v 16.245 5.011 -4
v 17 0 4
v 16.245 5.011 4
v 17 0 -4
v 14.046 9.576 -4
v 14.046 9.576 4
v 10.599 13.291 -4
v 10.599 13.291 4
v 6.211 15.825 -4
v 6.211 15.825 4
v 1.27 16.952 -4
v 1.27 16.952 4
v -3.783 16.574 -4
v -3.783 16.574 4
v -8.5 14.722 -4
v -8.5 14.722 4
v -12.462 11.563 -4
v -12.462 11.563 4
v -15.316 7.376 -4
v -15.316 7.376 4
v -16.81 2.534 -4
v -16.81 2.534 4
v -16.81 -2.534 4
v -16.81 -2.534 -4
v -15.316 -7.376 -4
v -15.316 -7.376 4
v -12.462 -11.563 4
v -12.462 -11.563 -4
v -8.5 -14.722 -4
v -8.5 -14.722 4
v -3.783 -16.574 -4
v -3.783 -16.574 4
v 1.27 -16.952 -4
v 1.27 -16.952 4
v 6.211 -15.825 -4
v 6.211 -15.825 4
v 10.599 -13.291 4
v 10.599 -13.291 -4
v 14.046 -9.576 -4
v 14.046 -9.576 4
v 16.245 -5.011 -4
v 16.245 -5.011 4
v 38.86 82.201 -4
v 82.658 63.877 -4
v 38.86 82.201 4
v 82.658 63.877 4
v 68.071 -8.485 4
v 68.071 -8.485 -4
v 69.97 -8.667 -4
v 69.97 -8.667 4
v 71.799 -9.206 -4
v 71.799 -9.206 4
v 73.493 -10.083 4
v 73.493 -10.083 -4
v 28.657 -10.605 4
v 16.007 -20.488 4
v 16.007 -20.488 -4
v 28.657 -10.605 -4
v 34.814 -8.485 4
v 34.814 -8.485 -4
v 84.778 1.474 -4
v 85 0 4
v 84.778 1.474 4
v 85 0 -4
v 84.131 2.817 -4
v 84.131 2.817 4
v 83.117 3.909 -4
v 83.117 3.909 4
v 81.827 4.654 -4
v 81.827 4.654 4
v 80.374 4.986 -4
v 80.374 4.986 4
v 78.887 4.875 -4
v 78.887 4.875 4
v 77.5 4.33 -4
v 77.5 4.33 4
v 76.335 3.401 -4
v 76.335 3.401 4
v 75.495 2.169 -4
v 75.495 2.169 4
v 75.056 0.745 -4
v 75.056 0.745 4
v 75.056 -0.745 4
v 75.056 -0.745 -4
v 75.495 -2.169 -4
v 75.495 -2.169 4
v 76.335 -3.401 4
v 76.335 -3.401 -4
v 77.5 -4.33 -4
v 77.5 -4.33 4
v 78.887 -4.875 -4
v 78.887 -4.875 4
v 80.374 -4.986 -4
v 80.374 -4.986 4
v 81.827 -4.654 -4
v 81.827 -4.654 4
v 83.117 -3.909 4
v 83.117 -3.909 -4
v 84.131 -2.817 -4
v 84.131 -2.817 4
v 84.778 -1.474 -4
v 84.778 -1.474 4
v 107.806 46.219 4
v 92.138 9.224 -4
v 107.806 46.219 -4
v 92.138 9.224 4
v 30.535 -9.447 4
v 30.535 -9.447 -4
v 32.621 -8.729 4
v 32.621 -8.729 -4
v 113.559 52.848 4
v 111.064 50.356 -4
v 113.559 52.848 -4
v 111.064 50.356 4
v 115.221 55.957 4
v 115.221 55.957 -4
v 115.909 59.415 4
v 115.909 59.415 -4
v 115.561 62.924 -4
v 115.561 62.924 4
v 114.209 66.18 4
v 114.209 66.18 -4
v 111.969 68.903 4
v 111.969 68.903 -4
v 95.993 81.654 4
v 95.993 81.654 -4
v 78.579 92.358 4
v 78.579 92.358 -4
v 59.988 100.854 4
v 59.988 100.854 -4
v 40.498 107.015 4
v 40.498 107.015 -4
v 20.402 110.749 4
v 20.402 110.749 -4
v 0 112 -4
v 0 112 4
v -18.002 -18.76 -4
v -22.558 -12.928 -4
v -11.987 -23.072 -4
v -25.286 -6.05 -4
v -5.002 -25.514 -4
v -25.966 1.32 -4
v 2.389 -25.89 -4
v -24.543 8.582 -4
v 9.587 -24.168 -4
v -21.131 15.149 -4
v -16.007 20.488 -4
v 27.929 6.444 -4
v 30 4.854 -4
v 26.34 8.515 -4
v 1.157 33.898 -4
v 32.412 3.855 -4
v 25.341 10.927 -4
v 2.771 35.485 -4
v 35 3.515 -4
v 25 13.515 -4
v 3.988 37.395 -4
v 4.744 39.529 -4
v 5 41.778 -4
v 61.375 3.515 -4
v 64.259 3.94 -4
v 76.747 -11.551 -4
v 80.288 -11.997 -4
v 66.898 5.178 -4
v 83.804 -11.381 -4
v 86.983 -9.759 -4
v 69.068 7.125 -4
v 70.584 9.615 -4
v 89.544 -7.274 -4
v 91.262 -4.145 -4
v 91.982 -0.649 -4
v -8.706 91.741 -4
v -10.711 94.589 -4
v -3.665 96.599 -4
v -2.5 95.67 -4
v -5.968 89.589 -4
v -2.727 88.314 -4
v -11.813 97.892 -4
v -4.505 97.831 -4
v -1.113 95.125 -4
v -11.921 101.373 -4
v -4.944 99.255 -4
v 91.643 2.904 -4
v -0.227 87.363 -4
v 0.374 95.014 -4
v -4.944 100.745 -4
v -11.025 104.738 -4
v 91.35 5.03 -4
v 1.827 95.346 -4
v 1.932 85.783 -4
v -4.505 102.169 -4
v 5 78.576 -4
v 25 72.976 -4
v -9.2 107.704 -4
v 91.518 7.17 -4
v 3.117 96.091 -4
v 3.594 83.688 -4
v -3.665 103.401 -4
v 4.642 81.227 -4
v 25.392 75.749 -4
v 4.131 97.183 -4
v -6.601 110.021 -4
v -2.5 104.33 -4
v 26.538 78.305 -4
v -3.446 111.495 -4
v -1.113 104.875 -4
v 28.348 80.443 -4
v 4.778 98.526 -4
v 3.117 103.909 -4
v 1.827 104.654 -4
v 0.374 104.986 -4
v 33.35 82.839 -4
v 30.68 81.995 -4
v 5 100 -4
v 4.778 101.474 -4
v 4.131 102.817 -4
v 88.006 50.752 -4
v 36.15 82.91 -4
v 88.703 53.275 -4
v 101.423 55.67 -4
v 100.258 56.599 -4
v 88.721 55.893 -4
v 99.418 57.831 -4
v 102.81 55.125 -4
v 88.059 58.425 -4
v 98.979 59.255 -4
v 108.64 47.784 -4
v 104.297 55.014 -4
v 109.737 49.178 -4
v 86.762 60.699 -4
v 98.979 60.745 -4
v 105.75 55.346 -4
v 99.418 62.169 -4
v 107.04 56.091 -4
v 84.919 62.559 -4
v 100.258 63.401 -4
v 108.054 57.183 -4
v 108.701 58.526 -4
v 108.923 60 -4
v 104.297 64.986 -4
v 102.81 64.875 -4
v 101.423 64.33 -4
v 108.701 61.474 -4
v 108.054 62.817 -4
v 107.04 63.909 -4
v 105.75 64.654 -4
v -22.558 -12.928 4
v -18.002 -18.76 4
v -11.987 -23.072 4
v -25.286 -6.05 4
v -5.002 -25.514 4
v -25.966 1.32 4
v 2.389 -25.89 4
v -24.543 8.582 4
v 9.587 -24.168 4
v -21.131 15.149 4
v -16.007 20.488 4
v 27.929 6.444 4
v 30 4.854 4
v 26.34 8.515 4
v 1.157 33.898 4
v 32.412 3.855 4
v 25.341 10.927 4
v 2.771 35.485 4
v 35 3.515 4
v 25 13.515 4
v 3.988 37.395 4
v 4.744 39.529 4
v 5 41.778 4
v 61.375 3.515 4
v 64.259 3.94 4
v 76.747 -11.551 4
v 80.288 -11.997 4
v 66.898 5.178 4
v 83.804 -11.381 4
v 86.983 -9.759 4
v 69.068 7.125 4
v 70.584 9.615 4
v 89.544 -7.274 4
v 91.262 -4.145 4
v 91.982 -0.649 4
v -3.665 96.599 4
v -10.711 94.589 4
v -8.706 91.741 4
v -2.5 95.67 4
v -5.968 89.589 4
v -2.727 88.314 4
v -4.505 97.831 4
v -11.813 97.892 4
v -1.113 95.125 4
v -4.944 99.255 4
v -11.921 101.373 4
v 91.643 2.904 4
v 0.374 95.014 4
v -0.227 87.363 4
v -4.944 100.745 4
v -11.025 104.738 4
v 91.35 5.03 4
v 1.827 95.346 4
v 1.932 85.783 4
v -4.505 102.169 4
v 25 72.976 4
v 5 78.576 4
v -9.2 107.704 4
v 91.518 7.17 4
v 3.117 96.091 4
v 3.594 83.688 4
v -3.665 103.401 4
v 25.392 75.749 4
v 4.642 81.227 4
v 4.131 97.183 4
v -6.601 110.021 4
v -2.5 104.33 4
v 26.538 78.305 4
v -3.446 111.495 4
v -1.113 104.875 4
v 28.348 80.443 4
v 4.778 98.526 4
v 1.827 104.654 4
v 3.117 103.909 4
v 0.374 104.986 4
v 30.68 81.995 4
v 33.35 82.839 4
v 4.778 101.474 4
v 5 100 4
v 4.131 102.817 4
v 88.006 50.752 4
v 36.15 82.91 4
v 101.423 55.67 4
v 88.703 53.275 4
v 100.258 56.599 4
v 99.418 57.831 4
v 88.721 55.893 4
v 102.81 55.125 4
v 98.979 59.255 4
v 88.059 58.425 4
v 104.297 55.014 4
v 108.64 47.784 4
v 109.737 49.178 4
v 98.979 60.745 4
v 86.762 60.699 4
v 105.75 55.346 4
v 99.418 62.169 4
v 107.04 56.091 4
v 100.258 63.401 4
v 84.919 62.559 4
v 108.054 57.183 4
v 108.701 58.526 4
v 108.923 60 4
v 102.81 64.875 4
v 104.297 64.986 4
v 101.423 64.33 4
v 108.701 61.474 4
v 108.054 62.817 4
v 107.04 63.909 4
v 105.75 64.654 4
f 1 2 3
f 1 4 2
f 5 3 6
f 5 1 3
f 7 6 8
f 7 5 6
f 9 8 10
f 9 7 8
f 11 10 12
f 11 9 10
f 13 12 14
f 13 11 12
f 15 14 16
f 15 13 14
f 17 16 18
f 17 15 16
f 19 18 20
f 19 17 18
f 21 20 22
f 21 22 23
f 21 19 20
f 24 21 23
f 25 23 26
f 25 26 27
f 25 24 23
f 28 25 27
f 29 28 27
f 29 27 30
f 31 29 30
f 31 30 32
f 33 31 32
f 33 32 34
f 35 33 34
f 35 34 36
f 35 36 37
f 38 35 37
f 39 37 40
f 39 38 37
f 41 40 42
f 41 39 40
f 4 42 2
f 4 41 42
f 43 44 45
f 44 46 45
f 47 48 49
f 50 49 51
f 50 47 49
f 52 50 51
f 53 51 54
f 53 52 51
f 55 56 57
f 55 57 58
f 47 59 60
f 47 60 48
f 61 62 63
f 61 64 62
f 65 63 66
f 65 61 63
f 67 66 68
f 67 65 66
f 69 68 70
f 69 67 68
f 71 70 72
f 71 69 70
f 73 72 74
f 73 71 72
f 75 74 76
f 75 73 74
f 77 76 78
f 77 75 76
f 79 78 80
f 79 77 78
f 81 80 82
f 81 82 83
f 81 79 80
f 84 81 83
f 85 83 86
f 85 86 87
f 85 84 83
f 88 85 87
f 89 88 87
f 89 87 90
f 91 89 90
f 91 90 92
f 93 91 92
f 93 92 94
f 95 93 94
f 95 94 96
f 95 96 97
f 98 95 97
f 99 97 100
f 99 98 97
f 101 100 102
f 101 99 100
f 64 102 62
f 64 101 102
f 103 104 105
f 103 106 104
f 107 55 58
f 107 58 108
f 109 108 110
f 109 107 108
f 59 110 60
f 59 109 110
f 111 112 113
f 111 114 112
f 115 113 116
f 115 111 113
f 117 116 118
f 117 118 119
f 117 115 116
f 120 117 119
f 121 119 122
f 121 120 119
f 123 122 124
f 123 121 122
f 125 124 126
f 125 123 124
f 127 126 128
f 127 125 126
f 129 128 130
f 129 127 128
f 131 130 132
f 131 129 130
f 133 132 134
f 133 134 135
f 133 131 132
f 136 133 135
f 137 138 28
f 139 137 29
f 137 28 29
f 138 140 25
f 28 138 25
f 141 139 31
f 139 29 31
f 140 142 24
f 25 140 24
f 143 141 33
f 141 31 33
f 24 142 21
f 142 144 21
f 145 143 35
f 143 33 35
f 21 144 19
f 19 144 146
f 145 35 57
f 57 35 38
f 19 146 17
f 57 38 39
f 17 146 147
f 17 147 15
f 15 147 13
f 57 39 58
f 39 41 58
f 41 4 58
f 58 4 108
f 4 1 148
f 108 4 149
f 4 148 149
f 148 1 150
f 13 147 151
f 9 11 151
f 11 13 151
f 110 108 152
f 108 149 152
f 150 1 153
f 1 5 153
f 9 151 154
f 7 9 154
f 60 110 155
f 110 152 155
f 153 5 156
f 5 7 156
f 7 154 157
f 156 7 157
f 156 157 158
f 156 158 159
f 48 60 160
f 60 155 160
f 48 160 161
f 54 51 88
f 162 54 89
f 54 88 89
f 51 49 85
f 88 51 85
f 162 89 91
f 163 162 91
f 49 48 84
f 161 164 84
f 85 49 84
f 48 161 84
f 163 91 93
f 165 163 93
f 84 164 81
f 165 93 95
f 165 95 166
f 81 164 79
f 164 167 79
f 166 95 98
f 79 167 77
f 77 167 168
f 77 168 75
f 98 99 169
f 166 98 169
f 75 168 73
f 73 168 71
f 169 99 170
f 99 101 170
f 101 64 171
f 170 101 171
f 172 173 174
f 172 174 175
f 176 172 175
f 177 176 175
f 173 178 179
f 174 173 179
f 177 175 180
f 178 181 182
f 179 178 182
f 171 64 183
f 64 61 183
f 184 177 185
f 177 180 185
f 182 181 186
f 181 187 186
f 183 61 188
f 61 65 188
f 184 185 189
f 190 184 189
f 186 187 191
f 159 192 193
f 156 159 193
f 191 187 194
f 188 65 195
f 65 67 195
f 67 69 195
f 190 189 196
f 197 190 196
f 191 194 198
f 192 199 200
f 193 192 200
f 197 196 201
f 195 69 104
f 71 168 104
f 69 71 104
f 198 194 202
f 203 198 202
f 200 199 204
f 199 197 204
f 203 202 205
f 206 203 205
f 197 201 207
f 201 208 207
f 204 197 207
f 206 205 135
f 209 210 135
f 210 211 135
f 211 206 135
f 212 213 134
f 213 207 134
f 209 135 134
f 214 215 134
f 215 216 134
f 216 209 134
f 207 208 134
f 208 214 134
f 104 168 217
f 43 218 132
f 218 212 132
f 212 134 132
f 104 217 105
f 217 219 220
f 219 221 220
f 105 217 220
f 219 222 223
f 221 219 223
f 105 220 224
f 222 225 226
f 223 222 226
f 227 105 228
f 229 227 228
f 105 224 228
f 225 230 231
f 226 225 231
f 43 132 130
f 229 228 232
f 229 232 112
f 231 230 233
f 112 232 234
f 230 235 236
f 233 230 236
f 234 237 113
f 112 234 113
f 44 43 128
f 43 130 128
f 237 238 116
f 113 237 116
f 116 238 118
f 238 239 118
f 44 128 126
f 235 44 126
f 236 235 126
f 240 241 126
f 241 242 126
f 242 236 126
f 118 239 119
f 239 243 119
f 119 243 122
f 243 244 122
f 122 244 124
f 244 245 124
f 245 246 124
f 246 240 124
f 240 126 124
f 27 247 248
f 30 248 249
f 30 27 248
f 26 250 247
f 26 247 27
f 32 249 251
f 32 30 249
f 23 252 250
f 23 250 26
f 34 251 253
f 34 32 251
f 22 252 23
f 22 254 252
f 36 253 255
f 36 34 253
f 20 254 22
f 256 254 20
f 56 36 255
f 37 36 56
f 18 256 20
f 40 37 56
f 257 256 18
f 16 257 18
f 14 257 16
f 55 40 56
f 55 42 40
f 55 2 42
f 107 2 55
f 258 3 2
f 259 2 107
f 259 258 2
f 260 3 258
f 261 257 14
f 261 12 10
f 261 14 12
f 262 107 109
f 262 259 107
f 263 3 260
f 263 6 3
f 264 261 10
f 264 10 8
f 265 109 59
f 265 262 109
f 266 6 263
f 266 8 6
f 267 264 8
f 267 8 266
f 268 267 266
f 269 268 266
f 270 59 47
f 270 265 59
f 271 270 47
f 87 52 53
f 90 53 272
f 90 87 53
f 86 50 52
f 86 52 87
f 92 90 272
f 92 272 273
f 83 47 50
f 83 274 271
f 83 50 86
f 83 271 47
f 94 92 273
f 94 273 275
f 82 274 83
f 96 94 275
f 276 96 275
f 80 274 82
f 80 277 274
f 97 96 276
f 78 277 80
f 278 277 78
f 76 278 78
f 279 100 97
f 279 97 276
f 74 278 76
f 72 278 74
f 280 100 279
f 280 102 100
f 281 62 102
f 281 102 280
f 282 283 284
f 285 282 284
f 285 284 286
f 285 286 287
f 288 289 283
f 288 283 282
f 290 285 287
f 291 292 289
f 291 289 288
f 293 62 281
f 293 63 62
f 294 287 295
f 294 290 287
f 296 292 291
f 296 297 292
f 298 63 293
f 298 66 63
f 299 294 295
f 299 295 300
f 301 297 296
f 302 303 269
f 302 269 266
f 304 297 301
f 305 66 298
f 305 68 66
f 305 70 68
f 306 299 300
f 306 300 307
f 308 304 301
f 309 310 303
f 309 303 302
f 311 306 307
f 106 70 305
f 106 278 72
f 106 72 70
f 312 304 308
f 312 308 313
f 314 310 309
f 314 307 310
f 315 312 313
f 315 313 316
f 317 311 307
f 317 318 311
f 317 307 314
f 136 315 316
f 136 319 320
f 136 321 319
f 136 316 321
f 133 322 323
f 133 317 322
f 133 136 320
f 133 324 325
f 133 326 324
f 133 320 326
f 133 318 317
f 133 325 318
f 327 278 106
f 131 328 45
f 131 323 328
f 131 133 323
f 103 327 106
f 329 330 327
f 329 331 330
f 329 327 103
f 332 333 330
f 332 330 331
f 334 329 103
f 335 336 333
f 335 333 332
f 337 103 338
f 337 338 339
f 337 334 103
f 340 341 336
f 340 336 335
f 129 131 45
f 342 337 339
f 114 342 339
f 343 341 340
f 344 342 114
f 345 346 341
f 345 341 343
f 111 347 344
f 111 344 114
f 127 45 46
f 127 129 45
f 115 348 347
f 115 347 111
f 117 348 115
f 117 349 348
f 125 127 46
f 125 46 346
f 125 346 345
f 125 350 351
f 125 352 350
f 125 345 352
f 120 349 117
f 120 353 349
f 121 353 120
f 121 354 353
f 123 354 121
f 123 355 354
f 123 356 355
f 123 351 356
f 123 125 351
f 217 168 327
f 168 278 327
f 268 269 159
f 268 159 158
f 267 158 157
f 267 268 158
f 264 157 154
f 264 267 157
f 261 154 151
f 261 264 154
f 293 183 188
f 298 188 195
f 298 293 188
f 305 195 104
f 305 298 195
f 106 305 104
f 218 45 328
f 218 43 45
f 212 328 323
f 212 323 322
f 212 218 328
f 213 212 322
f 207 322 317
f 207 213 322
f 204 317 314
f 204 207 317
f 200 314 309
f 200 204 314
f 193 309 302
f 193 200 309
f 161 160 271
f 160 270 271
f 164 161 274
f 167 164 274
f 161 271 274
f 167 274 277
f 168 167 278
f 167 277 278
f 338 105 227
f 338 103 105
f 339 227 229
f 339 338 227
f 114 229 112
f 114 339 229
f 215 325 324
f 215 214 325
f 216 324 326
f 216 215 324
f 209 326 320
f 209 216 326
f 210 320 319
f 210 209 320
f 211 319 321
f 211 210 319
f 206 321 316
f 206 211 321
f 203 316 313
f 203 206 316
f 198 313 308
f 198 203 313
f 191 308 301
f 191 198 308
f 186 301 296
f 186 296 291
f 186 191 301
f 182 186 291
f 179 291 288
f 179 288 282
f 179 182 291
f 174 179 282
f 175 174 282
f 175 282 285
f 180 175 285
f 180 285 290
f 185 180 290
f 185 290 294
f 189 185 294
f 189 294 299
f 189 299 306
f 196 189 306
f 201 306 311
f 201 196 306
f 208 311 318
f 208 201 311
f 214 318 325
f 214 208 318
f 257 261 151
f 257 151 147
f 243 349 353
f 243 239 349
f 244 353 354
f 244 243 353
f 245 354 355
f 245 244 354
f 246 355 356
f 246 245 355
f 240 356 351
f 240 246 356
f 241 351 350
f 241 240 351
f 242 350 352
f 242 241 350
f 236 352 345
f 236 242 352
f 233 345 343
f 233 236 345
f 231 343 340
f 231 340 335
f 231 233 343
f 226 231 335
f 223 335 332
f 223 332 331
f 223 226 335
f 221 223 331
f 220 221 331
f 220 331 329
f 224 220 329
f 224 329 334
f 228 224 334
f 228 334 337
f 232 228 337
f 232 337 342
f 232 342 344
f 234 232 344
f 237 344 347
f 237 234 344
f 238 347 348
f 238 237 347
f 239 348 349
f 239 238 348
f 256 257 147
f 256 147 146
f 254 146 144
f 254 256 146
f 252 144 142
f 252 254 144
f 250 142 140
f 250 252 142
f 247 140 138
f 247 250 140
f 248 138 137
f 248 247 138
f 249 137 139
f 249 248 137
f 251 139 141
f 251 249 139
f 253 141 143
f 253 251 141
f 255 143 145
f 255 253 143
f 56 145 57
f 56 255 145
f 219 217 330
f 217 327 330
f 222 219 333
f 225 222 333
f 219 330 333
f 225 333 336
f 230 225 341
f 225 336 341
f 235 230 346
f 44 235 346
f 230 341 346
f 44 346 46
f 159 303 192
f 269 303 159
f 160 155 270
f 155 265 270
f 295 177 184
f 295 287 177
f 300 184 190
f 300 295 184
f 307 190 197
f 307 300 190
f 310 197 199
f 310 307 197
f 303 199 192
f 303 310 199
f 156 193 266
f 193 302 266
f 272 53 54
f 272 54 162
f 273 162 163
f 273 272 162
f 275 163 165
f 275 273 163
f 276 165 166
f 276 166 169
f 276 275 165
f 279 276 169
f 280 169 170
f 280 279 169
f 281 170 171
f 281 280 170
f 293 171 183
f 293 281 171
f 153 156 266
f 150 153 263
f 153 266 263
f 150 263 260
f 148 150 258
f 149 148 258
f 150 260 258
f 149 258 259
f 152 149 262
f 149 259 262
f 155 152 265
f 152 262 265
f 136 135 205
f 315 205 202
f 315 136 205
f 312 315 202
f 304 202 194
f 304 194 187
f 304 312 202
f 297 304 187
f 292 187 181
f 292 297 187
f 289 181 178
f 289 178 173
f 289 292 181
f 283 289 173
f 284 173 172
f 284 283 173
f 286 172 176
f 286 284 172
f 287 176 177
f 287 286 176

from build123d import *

# Parameters (mm, degrees)
SKETCH1_R           = 17
SKETCH1_R_2         = 5
BOSS_EXTRUDE1_DEPTH = 4


with BuildPart() as part:
    # Sketch1 → Boss-Extrude1 (new, symmetric)
    with BuildSketch(Plane.XY):
        with BuildLine():
            Line((5, 78.575714714), (5, 41.77822761))
            ThreePointArc((5, 41.77822761), (3.987940463, 37.394516142), (1.156614753, 33.898120074))
            Line((1.156614753, 33.898120074), (-16.007198358, 20.488279594))
            ThreePointArc((-16.007198358, 20.488279594), (-20.488279594, -16.007198358), (16.007198358, -20.488279594))
            Line((16.007198358, -20.488279594), (28.65699687, -10.605173838))
            ThreePointArc((28.65699687, -10.605173838), (31.557930079, -9.030095618), (34.813611624, -8.485281374))
            Line((34.813611624, -8.485281374), (68.071279511, -8.485281374))
            ThreePointArc((68.071279511, -8.485281374), (70.897583966, -8.892992642), (73.493425188, -10.08288075))
            ThreePointArc((73.493425188, -10.08288075), (86.982957468, -9.759011477), (91.643297853, 2.904068715))
            ThreePointArc((91.643297853, 2.904068715), (91.376524695, 6.104282152), (92.137861813, 9.224041719))
            Line((92.137861813, 9.224041719), (107.806206108, 46.218943848))
            ThreePointArc((107.806206108, 46.218943848), (109.157818303, 48.505648792), (111.063780403, 50.355833512))
            ThreePointArc((111.063780403, 50.355833512), (115.90879124, 59.4152181), (111.968703818, 68.903225806))
            ThreePointArc((111.968703818, 68.903225806), (59.988170877, 100.853839718), (0, 112))
            ThreePointArc((0, 112), (-11.921234951, 101.372646075), (-2.727272727, 88.314026208))
            ThreePointArc((-2.727272727, 88.314026208), (2.833494518, 84.791530319), (5, 78.575714714))
        make_face()
        Circle(SKETCH1_R, mode=Mode.SUBTRACT)
        with Locations((0, 100)):
            Circle(SKETCH1_R_2, mode=Mode.SUBTRACT)
        with Locations((80, 0)):
            Circle(SKETCH1_R_2, mode=Mode.SUBTRACT)
        with Locations((103.923048454, 60)):
            Circle(SKETCH1_R_2, mode=Mode.SUBTRACT)
        with BuildLine():
            Line((25, 72.976113171), (25, 13.514718626))
            ThreePointArc((25, 13.514718626), (27.928932188, 6.443650814), (35, 3.514718626))
            Line((35, 3.514718626), (61.375366857, 3.514718626))
            ThreePointArc((61.375366857, 3.514718626), (66.898085507, 5.178077893), (70.583551108, 9.614802884))
            Line((70.583551108, 9.614802884), (88.006080219, 50.7515527))
            ThreePointArc((88.006080219, 50.7515527), (88.058512057, 58.42519202), (82.657599567, 63.876580264))
            Line((82.657599567, 63.876580264), (38.8597036, 82.201224993))
            ThreePointArc((38.8597036, 82.201224993), (29.459108194, 81.300686313), (25, 72.976113171))
        make_face(mode=Mode.SUBTRACT)
    extrude(amount=BOSS_EXTRUDE1_DEPTH, both=True)


solid = part.part
